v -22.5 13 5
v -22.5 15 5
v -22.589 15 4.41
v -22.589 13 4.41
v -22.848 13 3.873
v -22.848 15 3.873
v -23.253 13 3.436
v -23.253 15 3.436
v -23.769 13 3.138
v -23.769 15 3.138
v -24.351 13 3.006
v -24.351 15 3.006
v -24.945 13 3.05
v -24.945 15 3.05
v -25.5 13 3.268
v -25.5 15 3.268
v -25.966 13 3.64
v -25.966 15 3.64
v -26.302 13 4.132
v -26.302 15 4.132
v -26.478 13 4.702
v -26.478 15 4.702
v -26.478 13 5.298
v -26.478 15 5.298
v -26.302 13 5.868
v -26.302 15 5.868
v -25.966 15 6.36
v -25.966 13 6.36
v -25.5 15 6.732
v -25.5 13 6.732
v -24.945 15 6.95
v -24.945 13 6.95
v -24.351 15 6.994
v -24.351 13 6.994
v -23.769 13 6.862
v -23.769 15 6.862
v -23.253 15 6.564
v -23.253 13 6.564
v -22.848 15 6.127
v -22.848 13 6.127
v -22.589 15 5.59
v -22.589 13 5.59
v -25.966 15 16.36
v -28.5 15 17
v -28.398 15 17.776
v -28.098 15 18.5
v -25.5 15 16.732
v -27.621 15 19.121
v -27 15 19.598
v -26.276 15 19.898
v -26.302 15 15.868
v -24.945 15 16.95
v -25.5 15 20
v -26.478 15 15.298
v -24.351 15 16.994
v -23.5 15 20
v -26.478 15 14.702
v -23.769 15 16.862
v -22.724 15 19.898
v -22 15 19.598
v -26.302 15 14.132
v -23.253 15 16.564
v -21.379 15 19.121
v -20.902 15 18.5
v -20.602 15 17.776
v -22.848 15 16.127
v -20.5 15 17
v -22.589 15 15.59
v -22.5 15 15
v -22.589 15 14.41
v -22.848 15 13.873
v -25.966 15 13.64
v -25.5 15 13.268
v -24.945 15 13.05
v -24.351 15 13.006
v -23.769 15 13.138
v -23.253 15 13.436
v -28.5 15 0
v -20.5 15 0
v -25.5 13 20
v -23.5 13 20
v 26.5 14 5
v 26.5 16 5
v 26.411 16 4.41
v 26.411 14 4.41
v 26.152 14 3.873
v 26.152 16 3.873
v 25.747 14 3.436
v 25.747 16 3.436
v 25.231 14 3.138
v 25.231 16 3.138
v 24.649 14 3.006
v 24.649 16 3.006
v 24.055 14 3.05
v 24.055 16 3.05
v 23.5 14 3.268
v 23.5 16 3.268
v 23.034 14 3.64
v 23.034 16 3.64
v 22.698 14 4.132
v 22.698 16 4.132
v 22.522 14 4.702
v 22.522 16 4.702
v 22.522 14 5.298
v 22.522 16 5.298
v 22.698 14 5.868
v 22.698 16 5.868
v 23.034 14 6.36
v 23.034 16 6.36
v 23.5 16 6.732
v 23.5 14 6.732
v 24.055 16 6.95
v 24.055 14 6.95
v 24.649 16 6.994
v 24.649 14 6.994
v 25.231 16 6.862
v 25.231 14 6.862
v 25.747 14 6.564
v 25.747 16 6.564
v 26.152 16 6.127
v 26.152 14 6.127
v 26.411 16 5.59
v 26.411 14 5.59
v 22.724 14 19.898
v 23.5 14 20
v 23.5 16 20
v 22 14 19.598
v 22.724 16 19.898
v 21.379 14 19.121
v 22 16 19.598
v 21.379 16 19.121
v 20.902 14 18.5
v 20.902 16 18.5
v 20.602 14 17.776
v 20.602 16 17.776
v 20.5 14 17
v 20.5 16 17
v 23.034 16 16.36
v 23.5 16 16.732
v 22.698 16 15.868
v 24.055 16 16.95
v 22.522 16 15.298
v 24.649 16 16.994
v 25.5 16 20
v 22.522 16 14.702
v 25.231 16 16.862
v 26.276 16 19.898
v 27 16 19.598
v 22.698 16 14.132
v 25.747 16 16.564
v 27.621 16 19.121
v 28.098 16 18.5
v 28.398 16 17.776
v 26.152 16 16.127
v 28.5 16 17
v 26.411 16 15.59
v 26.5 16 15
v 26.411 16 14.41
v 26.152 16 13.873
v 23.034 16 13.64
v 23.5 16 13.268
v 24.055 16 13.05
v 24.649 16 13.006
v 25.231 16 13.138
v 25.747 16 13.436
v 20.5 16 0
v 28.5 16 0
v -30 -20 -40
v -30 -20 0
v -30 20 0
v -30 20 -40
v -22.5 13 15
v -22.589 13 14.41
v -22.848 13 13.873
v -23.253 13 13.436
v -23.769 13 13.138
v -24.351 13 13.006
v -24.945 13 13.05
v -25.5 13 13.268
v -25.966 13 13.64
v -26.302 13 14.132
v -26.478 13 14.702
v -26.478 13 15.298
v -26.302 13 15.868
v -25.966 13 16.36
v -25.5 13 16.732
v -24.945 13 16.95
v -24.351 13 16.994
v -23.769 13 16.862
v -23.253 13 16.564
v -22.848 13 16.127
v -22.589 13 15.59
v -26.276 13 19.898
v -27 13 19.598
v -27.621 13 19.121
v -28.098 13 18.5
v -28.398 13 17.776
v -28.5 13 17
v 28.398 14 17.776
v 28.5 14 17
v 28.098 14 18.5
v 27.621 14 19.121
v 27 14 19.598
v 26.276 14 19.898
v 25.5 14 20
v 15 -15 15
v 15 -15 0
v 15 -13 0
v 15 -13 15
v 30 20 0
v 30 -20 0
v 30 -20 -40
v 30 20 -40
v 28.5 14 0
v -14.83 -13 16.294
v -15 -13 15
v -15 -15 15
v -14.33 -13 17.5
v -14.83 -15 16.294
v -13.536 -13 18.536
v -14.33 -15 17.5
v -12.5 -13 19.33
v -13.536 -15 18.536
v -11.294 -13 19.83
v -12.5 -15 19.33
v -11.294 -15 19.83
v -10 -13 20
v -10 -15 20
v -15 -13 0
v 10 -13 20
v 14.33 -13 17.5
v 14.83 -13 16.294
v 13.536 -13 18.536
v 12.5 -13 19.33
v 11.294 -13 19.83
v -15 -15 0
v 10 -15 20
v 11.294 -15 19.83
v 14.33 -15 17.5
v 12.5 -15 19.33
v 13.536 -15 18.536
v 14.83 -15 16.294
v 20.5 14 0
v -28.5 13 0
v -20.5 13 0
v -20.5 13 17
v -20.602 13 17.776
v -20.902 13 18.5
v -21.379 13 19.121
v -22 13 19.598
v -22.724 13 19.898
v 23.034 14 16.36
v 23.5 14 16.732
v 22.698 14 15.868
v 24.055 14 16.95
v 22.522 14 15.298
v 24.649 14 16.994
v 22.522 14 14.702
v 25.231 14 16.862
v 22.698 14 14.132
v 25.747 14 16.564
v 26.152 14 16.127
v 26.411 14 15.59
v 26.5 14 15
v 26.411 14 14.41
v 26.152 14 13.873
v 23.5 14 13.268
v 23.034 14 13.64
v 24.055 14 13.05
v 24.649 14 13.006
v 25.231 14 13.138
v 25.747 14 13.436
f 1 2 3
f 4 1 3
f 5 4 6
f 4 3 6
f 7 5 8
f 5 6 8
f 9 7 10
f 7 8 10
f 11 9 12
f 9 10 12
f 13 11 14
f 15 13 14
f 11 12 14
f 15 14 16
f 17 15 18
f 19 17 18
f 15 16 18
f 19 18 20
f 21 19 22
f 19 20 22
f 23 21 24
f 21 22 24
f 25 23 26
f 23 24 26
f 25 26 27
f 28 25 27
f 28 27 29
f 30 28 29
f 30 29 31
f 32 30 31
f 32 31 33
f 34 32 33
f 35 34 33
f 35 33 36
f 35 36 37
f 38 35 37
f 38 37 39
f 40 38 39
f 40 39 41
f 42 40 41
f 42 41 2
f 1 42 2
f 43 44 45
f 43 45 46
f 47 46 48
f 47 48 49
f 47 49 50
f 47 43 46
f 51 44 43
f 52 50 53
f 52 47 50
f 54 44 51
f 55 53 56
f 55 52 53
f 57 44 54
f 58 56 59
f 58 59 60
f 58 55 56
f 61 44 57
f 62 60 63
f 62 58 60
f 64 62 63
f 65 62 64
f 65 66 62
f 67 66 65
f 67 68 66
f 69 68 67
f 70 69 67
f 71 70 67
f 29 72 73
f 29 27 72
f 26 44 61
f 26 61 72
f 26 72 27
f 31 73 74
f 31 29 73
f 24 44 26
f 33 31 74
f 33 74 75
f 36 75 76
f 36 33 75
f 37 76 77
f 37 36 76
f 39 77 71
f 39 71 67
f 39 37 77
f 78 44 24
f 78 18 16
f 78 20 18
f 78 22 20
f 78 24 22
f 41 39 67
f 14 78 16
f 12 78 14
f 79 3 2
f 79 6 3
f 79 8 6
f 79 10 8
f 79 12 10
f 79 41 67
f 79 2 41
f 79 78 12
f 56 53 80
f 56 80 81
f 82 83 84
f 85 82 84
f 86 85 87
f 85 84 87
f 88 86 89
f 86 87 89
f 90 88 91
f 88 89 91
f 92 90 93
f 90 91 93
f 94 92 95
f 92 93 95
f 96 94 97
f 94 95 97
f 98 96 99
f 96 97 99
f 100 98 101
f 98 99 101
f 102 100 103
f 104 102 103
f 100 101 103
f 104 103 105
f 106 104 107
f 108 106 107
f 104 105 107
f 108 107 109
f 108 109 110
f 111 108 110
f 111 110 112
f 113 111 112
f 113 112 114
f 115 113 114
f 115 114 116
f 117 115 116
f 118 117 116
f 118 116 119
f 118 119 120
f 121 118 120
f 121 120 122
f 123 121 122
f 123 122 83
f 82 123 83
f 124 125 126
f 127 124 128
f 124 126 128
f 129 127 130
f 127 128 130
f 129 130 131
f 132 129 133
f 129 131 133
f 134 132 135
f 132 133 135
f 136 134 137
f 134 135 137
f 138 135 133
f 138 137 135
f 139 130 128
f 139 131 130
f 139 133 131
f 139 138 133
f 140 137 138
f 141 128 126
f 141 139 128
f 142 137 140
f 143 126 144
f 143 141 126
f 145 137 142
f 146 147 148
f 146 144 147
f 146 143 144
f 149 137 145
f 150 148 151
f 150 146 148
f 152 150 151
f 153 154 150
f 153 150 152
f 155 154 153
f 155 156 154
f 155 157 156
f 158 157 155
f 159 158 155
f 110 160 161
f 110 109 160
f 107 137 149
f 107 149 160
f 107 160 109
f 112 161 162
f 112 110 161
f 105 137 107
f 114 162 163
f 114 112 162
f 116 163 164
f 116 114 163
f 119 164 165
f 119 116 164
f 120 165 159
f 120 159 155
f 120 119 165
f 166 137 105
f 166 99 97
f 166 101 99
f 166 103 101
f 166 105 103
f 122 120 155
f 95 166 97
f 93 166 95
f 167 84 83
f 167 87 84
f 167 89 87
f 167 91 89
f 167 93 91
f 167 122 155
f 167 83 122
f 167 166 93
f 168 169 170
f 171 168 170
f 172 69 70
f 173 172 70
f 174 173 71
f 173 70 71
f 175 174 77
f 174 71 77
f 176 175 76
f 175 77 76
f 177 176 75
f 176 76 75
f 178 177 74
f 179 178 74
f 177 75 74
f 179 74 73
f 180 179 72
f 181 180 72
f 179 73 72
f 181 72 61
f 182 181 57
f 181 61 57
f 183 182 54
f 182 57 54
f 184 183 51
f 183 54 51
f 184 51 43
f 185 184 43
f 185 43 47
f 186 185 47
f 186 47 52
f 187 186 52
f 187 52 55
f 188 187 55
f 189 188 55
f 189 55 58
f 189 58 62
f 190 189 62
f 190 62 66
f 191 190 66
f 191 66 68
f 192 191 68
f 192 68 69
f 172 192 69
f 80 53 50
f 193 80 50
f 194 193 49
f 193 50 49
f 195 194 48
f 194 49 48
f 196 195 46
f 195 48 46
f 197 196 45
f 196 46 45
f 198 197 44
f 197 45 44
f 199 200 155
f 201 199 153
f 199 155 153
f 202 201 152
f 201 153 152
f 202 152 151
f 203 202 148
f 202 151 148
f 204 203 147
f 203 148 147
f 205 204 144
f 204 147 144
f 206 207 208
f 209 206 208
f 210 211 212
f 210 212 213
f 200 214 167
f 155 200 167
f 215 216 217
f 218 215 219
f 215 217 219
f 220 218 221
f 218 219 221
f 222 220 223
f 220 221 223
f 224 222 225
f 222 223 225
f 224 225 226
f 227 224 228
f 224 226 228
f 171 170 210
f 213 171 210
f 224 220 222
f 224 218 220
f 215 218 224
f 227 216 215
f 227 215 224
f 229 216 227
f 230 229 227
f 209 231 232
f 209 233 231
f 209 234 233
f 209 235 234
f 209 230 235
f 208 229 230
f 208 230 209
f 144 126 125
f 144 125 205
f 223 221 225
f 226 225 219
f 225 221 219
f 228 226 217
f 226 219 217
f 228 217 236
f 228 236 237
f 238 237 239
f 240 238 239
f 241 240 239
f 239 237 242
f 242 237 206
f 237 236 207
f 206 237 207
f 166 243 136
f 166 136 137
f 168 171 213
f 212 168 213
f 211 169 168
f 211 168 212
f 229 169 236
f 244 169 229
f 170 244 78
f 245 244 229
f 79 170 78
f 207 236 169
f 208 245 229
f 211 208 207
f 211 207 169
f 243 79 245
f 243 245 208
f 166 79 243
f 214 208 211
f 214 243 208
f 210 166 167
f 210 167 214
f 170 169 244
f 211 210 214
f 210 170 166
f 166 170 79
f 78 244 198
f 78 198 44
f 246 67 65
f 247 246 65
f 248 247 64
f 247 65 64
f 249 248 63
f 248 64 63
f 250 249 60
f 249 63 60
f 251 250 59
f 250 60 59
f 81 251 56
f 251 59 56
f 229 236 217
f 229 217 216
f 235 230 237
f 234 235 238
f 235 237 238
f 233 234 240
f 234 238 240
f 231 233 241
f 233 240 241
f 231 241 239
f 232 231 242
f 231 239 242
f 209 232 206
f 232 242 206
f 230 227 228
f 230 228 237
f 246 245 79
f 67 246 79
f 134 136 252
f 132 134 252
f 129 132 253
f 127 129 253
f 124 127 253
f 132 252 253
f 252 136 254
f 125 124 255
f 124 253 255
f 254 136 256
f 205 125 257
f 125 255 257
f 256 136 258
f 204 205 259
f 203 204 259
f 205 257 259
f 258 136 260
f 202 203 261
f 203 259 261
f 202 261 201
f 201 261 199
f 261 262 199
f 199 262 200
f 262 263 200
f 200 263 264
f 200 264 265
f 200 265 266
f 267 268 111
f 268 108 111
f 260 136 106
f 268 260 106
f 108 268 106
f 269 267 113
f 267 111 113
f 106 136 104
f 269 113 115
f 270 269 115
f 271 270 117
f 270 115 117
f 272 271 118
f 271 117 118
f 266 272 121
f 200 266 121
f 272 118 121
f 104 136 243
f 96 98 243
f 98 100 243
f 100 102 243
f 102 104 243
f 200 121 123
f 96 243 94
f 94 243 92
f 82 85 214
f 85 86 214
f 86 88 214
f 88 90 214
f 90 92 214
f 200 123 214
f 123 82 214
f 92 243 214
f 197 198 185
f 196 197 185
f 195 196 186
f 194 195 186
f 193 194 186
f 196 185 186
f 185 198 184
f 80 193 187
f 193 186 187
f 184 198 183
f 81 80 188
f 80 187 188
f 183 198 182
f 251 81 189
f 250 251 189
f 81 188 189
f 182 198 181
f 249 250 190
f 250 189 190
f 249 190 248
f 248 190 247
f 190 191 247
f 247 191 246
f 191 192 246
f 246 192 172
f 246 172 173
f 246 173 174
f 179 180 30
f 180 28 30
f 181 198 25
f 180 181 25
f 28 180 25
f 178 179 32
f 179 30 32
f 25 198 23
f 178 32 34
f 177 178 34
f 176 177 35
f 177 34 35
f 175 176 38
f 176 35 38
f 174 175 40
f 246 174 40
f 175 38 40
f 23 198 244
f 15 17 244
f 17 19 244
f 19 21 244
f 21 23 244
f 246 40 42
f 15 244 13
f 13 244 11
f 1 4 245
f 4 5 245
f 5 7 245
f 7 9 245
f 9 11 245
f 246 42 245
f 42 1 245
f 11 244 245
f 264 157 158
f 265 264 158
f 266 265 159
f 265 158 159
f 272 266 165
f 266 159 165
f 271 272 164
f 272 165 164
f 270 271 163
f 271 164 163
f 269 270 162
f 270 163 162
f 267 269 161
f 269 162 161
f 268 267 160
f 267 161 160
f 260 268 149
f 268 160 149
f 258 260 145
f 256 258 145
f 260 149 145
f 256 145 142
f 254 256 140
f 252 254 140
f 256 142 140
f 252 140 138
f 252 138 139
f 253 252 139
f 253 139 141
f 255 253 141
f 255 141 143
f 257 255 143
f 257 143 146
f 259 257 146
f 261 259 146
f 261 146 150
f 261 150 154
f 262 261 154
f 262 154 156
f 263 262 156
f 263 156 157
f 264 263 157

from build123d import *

# Parameters (mm, degrees)
IZIM1_W                     = 60
IZIM1_H                     = 40
Y_KSEKLIK_EKSTR_ZYON1_DEPTH = 40
IZIM1_3_W                   = 8
IZIM1_3_H                   = 2
IZIM1_3_W_2                 = 30
Y_KSEKLIK_EKSTR_ZYON2_DEPTH = 20
IZIM4_R                     = 2
KES_EKSTR_ZYON1_DEPTH       = 62.611687203
KES_EKSTR_ZYON2_DEPTH       = 20


with BuildPart() as part:
    # Çizim1 → Yükseklik-Ekstrüzyon1 (new body)
    with BuildSketch(Plane.XY):
        Rectangle(IZIM1_W, IZIM1_H)
    extrude(amount=-Y_KSEKLIK_EKSTR_ZYON1_DEPTH)

    # Çizim1<3> → Yükseklik-Ekstrüzyon2 (add)
    with BuildSketch(Plane.XY):
        with Locations((-24.5, 14)):
            Rectangle(IZIM1_3_W, IZIM1_3_H)
        with Locations((24.5, 15)):
            Rectangle(IZIM1_3_W, IZIM1_3_H)
        with Locations((0, -14)):
            Rectangle(IZIM1_3_W_2, IZIM1_3_H)
    extrude(amount=Y_KSEKLIK_EKSTR_ZYON2_DEPTH)

    # Çizim4 → Kes-Ekstrüzyon1 (cut, through all)
    with BuildSketch(Plane(origin=(0, 16, 0), x_dir=(1, 0, 0), z_dir=(0, 1, 0))):
        with BuildLine():
            ThreePointArc((-25.5, -20), (-27.621320344, -19.121320344), (-28.5, -17))
            Line((-28.5, -17), (-28.5, -20))
            Line((-28.5, -20), (-25.5, -20))
        make_face()
        with BuildLine():
            Line((-20.5, -20), (-20.5, -17))
            ThreePointArc((-20.5, -17), (-21.378679656, -19.121320344), (-23.5, -20))
            Line((-23.5, -20), (-20.5, -20))
        make_face()
        with BuildLine():
            ThreePointArc((23.5, -20), (21.378679656, -19.121320344), (20.5, -17))
            Line((20.5, -17), (20.5, -20))
            Line((20.5, -20), (23.5, -20))
        make_face()
        with BuildLine():
            Line((28.5, -20), (28.5, -17))
            ThreePointArc((28.5, -17), (27.621320344, -19.121320344), (25.5, -20))
            Line((25.5, -20), (28.5, -20))
        make_face()
        with Locations((24.5, -5)):
            Circle(IZIM4_R)
        with Locations((24.5, -15)):
            Circle(IZIM4_R)
        with Locations((-24.5, -5)):
            Circle(IZIM4_R)
        with Locations((-24.5, -15)):
            Circle(IZIM4_R)
    extrude(amount=-KES_EKSTR_ZYON1_DEPTH, mode=Mode.SUBTRACT)

    # Çizim5 → Kes-Ekstrüzyon2 (cut)
    with BuildSketch(Plane.XZ.offset(15)):
        with BuildLine():
            Line((-15, 20), (-15, 15))
            ThreePointArc((-15, 15), (-13.535533906, 18.535533906), (-10, 20))
            Line((-10, 20), (-15, 20))
        make_face()
        with BuildLine():
            Line((15, 20), (10, 20))
            ThreePointArc((10, 20), (13.535533906, 18.535533906), (15, 15))
            Line((15, 15), (15, 20))
        make_face()
    extrude(amount=-KES_EKSTR_ZYON2_DEPTH, mode=Mode.SUBTRACT)


solid = part.part
